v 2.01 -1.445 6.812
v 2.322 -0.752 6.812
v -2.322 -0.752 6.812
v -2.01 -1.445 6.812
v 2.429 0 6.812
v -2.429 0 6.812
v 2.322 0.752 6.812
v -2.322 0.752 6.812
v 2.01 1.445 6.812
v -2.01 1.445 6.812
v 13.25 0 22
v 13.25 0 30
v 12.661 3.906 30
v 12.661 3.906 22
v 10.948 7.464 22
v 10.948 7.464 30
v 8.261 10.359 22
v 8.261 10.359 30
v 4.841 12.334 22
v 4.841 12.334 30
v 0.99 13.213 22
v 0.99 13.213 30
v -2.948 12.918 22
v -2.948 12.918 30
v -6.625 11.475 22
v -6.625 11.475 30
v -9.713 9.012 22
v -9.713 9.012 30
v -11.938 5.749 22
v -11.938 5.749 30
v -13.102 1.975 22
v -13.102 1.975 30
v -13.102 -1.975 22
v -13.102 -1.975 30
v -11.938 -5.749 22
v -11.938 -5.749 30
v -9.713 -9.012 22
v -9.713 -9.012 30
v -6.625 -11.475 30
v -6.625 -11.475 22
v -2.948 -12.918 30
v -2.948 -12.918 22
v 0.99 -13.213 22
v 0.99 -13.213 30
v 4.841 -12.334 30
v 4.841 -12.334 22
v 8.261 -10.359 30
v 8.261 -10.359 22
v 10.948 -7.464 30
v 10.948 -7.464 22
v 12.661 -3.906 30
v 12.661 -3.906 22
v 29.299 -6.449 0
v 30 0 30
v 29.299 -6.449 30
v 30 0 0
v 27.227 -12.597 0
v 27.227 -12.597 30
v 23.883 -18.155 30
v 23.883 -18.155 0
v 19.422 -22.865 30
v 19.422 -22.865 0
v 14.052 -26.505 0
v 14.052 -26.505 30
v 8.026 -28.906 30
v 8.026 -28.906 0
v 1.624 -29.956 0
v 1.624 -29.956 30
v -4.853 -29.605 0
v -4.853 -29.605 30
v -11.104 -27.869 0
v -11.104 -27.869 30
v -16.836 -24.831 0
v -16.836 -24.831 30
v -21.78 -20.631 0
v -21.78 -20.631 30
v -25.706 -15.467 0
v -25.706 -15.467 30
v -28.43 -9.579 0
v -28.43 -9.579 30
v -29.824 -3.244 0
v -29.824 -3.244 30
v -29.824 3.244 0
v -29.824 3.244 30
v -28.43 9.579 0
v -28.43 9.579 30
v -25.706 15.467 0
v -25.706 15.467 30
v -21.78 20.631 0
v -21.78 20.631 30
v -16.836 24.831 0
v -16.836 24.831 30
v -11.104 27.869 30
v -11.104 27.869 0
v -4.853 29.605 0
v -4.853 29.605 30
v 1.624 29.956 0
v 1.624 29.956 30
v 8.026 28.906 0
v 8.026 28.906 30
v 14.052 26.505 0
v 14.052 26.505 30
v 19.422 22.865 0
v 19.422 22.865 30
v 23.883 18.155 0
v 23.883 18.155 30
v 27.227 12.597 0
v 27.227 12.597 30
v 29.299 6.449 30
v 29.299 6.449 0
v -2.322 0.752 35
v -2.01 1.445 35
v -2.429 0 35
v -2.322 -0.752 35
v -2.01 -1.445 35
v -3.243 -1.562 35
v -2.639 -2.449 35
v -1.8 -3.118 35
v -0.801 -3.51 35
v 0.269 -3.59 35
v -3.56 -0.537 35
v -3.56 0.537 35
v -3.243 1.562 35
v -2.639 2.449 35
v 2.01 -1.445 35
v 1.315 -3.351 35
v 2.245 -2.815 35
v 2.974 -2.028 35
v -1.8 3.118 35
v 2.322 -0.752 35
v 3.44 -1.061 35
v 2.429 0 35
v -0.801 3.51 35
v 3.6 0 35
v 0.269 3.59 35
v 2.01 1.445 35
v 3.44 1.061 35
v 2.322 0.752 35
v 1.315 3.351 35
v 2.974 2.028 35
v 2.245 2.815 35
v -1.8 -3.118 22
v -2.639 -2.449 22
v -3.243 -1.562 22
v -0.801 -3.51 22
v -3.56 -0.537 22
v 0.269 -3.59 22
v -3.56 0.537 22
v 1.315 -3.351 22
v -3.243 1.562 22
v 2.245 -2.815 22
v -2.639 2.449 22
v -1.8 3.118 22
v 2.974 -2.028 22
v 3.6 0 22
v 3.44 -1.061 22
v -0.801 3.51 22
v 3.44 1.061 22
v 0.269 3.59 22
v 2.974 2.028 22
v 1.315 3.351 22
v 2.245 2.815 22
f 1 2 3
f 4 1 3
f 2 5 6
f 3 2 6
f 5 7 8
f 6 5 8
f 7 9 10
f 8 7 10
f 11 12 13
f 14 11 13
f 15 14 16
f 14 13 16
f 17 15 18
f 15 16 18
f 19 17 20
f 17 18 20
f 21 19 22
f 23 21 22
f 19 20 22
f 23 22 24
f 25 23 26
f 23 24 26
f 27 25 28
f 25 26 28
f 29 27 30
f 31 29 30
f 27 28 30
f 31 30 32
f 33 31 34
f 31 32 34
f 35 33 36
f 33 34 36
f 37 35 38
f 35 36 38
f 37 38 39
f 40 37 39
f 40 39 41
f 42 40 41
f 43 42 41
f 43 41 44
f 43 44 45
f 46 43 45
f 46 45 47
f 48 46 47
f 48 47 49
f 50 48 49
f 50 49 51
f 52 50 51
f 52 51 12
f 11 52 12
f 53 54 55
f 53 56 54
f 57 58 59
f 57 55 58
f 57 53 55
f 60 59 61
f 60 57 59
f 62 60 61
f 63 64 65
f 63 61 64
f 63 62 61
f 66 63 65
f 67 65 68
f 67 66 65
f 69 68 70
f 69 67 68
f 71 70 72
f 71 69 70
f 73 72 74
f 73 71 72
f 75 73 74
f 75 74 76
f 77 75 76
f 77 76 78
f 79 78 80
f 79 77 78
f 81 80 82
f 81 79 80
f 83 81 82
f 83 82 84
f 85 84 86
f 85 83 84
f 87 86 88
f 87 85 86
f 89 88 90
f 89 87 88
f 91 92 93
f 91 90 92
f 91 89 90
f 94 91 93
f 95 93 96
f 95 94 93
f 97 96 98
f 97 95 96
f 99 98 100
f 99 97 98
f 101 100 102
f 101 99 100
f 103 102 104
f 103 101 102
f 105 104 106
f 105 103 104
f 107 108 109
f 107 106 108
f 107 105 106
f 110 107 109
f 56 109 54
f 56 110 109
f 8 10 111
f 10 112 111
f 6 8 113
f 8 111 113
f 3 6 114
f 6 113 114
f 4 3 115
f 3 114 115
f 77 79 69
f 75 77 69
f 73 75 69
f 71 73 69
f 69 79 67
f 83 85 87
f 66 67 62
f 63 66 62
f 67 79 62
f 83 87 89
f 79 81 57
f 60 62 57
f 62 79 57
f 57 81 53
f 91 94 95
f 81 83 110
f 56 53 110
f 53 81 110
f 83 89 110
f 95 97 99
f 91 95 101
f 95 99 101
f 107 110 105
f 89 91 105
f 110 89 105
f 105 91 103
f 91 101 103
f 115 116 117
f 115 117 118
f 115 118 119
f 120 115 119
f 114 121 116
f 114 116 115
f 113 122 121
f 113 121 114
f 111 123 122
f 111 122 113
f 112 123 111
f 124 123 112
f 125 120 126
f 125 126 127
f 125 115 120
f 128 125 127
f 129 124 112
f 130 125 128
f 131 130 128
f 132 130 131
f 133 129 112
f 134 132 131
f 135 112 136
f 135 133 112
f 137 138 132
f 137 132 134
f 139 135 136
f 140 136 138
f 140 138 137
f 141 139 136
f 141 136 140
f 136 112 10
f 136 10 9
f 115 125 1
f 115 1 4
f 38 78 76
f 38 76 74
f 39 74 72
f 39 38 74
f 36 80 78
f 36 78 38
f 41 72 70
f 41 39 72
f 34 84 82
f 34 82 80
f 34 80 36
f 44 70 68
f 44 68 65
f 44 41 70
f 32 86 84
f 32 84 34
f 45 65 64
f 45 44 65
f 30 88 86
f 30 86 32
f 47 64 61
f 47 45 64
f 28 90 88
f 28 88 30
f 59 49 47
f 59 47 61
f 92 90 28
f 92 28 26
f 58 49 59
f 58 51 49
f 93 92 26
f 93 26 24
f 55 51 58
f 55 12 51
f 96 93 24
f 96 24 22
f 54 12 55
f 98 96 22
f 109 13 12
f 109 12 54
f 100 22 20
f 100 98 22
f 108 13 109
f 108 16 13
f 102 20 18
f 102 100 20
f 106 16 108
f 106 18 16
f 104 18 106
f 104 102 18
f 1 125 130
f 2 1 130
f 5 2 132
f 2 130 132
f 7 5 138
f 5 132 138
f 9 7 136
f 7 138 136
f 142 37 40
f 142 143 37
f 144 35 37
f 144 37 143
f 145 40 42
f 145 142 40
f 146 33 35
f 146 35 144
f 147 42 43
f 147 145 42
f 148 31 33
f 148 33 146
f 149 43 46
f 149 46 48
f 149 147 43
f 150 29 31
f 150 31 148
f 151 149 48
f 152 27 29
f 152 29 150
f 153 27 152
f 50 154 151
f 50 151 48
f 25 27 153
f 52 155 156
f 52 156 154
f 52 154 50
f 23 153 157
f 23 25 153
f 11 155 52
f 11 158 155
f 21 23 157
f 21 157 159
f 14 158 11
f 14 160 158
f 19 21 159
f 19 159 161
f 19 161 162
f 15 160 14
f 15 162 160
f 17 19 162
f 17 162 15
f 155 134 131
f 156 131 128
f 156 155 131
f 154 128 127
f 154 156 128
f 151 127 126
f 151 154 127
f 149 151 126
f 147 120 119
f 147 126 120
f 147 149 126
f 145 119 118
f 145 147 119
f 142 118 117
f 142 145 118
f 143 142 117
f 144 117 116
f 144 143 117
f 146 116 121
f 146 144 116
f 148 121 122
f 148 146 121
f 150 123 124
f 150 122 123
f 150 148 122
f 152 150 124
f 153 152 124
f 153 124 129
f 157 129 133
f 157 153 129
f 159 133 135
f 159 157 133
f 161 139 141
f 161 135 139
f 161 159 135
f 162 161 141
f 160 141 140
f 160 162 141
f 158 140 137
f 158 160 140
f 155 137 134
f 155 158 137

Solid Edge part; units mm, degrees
sketch "Sketch1" plane through (0, 0, 0) normal (0, 0, 1) x (1, 0, 0)
  circle A0 centre (0, 0) radius 30
  dimension "D1" = 60
extrude "Ajout_matière_1" add sketch "Sketch1" along normal blind 30
sketch "Sketch2" plane through (0, 0, 30) normal (0, 0, 1) x (1, 0, 0)
  circle A0 centre (0, 0) radius 13.25
  dimension "D1" = 26.5
extrude "Enlèvement_matière_1" cut sketch "Sketch2" against normal blind 8
sketch "Sketch3" plane through (0, 0, 0) normal (0, 0, 1) x (1, 0, 0)
  circle A0 centre (0, 0) radius 3.6
  dimension "D1" = 7.2
extrude "Ajout_matière_2" add sketch "Sketch3" along normal blind 35
sketch "Sketch4" plane through (0, 0, 35) normal (0, 0, 1) x (1, 0, 0)
  line L0 (-2.01, 1.445) -> (2.01, 1.445)
  arc A0 (2.01, 1.445) -> (2.01, -1.445) centre (-0.2708, 0) cw
  line L1 (2.01, -1.445) -> (-2.01, -1.445)
  arc A1 (-2.01, -1.445) -> (-2.01, 1.445) centre (0.2708, 0) cw
  dimension "D1" = 4.02
  dimension "D2" = 2.7
  dimension "D3" = 2.7
extrude "Enlèvement_matière_2" cut sketch "Sketch4" against normal blind 28.188
properties material "Acier S235"
